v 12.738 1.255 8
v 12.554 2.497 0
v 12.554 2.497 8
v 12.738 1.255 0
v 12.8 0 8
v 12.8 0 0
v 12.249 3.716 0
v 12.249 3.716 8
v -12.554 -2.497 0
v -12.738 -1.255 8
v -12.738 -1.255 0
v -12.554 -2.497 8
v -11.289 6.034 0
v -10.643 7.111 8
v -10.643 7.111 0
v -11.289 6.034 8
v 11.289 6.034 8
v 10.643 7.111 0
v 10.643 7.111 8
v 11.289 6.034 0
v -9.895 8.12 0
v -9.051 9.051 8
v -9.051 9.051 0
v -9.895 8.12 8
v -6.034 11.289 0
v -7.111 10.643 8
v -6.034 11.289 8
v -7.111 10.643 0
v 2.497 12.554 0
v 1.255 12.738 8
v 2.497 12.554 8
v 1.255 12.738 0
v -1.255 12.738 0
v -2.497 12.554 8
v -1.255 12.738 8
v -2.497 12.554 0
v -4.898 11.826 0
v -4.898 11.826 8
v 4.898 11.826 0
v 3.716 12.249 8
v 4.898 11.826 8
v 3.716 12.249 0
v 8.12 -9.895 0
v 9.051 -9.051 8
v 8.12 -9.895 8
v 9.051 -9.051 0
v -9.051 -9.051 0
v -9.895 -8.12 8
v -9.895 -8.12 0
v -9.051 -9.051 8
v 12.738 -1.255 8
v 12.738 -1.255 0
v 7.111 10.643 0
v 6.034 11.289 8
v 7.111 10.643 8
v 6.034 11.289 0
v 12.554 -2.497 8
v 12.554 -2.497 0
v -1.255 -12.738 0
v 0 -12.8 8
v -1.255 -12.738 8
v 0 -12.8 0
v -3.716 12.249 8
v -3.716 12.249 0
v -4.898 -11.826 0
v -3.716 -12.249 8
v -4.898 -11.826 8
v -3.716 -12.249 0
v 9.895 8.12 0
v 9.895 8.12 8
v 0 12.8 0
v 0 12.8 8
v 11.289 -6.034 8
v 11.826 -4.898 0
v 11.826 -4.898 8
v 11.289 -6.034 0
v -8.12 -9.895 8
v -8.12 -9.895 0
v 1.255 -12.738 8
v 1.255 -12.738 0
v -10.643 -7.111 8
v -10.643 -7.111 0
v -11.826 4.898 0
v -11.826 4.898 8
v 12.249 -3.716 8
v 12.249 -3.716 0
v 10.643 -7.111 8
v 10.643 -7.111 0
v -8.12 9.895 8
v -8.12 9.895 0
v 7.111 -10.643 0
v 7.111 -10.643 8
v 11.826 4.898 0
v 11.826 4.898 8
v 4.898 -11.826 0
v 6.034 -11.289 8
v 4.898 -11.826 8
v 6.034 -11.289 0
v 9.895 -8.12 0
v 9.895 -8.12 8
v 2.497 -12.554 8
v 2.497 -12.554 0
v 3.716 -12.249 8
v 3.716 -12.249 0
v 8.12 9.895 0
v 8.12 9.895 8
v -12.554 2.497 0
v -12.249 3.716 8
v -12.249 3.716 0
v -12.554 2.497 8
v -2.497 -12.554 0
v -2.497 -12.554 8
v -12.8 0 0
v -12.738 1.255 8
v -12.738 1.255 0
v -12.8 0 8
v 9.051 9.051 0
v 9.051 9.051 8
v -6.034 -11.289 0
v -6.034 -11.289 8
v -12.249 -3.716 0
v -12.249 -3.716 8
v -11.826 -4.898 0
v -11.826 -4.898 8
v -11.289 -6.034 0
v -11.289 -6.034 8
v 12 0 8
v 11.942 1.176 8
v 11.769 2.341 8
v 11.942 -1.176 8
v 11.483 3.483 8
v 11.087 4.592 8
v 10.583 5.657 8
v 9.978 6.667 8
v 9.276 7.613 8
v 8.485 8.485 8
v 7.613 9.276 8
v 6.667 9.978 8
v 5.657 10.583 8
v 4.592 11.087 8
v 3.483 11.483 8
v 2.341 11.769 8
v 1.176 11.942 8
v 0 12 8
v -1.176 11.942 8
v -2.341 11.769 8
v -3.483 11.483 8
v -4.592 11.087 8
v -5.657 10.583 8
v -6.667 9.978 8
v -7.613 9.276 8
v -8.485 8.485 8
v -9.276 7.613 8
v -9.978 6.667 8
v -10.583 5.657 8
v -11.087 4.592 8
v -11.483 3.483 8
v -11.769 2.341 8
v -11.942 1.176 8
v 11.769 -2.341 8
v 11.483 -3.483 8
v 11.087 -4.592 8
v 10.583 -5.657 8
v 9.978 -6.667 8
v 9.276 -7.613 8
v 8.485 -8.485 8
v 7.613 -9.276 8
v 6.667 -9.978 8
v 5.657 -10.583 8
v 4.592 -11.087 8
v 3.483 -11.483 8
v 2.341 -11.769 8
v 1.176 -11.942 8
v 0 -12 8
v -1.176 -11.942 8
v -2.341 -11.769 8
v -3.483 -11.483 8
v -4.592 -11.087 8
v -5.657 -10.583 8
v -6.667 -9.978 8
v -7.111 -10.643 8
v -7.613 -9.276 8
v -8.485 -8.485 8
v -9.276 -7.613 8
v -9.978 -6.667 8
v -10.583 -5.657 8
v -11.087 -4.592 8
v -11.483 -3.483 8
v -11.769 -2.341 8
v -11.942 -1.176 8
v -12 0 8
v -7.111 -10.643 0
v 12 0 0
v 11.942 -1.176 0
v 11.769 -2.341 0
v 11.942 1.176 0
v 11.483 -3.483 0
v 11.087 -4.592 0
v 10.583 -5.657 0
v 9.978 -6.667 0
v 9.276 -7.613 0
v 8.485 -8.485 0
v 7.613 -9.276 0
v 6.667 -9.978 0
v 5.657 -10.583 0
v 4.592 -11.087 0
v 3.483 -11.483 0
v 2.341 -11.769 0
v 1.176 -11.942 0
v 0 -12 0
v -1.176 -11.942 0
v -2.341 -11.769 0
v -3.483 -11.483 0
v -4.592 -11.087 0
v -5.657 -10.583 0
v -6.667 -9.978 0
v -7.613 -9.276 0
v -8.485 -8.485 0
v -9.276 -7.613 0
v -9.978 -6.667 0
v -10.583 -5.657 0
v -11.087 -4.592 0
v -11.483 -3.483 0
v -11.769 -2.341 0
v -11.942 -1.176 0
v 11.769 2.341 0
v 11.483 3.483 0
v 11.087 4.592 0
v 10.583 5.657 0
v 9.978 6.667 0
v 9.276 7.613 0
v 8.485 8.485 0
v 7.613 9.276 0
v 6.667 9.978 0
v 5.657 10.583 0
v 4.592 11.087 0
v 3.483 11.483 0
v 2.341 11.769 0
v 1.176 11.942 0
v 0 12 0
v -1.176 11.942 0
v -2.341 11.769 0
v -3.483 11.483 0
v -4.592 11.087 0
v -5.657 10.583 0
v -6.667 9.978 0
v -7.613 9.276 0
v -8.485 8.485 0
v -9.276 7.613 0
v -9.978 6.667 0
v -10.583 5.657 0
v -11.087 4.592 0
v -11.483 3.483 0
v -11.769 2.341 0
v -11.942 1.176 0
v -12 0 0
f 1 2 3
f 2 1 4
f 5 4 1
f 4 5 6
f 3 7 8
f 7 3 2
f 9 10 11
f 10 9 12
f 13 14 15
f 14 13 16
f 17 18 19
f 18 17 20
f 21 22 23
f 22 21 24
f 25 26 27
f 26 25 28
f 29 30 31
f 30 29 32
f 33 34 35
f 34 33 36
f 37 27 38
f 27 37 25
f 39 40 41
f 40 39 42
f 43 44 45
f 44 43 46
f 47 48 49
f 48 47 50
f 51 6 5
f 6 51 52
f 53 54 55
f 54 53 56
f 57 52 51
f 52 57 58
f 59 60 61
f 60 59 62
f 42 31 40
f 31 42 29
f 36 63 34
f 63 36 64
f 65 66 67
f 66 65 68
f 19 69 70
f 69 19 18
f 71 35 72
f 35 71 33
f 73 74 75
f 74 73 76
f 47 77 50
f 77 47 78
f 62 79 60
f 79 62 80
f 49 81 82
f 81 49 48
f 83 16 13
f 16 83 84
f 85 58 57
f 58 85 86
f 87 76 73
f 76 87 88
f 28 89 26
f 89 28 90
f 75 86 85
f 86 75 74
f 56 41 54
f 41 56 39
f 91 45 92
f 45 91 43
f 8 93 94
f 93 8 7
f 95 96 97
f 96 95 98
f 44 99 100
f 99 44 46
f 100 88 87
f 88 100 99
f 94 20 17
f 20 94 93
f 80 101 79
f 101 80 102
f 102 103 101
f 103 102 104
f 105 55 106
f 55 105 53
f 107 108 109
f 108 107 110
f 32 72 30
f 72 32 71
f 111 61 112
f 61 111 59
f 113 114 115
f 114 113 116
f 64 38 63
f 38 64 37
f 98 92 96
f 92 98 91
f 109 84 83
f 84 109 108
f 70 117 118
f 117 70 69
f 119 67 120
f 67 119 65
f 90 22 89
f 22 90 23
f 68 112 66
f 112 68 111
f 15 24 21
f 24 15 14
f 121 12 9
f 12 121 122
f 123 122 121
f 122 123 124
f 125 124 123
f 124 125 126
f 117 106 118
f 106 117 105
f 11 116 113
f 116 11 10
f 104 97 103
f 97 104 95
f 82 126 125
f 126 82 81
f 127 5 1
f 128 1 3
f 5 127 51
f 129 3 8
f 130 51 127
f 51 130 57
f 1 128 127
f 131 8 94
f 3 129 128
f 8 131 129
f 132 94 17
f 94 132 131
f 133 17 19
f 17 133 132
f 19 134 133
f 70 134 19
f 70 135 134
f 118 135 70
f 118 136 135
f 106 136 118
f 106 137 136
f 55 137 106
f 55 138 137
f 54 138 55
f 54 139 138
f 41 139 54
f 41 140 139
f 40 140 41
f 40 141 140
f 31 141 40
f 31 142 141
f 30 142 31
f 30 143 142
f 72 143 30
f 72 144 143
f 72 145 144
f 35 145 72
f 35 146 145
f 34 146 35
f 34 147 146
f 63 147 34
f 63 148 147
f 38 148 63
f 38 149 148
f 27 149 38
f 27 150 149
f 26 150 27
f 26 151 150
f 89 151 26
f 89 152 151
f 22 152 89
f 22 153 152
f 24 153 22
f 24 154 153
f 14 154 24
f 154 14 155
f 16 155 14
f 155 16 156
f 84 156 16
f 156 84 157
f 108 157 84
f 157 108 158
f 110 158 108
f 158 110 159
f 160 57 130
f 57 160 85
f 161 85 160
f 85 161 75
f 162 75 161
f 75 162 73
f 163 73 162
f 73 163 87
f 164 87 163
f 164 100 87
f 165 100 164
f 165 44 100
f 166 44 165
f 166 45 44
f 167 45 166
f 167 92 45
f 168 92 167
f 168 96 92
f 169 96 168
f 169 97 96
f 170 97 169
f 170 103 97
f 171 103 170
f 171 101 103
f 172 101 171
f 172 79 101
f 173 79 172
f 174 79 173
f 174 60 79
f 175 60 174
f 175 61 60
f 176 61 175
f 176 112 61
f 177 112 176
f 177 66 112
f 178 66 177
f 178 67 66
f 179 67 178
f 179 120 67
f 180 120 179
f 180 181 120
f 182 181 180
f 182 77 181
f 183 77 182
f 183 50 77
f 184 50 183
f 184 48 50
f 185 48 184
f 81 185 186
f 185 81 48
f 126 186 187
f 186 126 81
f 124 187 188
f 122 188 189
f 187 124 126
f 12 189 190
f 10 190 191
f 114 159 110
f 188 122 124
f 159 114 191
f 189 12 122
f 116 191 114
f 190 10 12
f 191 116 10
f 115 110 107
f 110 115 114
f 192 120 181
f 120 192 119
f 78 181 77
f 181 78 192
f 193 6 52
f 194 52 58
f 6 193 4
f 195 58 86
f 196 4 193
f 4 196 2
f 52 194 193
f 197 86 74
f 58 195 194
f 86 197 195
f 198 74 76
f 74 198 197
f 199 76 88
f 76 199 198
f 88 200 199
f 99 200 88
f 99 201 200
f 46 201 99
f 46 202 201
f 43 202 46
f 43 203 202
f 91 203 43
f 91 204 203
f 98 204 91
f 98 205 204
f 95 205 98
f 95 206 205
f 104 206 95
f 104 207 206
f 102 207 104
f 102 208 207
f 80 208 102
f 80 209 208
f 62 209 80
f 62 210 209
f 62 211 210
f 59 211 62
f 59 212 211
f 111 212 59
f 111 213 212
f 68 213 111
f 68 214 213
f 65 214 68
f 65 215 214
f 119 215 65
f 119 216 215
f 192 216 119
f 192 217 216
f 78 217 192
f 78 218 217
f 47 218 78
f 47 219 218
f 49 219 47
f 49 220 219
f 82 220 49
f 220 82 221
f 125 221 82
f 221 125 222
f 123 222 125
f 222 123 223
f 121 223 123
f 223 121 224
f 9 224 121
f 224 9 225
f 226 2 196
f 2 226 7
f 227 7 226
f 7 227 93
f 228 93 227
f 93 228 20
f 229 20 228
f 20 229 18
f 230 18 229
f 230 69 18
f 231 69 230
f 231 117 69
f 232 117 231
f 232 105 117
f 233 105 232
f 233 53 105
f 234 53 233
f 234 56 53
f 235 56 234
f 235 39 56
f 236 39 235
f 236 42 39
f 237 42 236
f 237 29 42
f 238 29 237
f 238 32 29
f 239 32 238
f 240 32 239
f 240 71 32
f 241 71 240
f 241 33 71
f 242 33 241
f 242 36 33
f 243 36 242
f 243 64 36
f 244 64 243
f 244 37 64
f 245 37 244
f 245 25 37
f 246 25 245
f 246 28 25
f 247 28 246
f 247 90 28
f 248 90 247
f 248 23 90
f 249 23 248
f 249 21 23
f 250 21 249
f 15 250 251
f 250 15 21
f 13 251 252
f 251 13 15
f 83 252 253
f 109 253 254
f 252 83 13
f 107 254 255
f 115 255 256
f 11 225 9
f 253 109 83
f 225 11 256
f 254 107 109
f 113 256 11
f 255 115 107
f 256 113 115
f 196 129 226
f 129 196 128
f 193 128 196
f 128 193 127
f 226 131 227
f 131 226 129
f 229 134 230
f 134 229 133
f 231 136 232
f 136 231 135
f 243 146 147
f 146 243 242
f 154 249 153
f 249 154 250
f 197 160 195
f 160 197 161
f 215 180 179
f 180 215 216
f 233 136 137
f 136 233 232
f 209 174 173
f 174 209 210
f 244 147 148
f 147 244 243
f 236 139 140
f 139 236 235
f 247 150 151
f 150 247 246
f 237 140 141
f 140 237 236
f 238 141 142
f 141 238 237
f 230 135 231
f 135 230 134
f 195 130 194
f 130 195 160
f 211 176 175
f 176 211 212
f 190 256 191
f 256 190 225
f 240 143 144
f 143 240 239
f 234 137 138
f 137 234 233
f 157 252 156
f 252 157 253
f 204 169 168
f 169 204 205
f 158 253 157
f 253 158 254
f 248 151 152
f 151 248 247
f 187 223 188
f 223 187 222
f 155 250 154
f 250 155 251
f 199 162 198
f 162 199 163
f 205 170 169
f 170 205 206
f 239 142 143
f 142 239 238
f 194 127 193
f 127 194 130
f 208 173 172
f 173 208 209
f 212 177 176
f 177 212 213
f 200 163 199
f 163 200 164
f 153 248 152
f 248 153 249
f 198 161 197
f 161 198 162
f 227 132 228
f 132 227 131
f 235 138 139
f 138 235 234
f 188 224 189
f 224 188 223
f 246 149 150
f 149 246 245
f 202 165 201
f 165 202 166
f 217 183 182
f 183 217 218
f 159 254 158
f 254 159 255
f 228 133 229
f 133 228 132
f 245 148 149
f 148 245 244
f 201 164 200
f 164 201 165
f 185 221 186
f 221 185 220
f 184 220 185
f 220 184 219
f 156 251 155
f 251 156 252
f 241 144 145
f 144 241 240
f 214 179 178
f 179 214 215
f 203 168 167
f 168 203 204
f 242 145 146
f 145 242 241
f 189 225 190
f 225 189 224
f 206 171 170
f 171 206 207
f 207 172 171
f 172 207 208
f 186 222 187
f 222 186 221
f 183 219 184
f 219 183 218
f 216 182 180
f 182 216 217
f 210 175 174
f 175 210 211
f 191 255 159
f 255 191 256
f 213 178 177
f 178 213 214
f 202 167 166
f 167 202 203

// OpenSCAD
atty_d = 24;
band_h = 8;
thickness = 1.6;

$fn=64;

difference() {
  cylinder(d=atty_d+thickness, h=band_h);
  cylinder(d=atty_d, h=band_h);
}
